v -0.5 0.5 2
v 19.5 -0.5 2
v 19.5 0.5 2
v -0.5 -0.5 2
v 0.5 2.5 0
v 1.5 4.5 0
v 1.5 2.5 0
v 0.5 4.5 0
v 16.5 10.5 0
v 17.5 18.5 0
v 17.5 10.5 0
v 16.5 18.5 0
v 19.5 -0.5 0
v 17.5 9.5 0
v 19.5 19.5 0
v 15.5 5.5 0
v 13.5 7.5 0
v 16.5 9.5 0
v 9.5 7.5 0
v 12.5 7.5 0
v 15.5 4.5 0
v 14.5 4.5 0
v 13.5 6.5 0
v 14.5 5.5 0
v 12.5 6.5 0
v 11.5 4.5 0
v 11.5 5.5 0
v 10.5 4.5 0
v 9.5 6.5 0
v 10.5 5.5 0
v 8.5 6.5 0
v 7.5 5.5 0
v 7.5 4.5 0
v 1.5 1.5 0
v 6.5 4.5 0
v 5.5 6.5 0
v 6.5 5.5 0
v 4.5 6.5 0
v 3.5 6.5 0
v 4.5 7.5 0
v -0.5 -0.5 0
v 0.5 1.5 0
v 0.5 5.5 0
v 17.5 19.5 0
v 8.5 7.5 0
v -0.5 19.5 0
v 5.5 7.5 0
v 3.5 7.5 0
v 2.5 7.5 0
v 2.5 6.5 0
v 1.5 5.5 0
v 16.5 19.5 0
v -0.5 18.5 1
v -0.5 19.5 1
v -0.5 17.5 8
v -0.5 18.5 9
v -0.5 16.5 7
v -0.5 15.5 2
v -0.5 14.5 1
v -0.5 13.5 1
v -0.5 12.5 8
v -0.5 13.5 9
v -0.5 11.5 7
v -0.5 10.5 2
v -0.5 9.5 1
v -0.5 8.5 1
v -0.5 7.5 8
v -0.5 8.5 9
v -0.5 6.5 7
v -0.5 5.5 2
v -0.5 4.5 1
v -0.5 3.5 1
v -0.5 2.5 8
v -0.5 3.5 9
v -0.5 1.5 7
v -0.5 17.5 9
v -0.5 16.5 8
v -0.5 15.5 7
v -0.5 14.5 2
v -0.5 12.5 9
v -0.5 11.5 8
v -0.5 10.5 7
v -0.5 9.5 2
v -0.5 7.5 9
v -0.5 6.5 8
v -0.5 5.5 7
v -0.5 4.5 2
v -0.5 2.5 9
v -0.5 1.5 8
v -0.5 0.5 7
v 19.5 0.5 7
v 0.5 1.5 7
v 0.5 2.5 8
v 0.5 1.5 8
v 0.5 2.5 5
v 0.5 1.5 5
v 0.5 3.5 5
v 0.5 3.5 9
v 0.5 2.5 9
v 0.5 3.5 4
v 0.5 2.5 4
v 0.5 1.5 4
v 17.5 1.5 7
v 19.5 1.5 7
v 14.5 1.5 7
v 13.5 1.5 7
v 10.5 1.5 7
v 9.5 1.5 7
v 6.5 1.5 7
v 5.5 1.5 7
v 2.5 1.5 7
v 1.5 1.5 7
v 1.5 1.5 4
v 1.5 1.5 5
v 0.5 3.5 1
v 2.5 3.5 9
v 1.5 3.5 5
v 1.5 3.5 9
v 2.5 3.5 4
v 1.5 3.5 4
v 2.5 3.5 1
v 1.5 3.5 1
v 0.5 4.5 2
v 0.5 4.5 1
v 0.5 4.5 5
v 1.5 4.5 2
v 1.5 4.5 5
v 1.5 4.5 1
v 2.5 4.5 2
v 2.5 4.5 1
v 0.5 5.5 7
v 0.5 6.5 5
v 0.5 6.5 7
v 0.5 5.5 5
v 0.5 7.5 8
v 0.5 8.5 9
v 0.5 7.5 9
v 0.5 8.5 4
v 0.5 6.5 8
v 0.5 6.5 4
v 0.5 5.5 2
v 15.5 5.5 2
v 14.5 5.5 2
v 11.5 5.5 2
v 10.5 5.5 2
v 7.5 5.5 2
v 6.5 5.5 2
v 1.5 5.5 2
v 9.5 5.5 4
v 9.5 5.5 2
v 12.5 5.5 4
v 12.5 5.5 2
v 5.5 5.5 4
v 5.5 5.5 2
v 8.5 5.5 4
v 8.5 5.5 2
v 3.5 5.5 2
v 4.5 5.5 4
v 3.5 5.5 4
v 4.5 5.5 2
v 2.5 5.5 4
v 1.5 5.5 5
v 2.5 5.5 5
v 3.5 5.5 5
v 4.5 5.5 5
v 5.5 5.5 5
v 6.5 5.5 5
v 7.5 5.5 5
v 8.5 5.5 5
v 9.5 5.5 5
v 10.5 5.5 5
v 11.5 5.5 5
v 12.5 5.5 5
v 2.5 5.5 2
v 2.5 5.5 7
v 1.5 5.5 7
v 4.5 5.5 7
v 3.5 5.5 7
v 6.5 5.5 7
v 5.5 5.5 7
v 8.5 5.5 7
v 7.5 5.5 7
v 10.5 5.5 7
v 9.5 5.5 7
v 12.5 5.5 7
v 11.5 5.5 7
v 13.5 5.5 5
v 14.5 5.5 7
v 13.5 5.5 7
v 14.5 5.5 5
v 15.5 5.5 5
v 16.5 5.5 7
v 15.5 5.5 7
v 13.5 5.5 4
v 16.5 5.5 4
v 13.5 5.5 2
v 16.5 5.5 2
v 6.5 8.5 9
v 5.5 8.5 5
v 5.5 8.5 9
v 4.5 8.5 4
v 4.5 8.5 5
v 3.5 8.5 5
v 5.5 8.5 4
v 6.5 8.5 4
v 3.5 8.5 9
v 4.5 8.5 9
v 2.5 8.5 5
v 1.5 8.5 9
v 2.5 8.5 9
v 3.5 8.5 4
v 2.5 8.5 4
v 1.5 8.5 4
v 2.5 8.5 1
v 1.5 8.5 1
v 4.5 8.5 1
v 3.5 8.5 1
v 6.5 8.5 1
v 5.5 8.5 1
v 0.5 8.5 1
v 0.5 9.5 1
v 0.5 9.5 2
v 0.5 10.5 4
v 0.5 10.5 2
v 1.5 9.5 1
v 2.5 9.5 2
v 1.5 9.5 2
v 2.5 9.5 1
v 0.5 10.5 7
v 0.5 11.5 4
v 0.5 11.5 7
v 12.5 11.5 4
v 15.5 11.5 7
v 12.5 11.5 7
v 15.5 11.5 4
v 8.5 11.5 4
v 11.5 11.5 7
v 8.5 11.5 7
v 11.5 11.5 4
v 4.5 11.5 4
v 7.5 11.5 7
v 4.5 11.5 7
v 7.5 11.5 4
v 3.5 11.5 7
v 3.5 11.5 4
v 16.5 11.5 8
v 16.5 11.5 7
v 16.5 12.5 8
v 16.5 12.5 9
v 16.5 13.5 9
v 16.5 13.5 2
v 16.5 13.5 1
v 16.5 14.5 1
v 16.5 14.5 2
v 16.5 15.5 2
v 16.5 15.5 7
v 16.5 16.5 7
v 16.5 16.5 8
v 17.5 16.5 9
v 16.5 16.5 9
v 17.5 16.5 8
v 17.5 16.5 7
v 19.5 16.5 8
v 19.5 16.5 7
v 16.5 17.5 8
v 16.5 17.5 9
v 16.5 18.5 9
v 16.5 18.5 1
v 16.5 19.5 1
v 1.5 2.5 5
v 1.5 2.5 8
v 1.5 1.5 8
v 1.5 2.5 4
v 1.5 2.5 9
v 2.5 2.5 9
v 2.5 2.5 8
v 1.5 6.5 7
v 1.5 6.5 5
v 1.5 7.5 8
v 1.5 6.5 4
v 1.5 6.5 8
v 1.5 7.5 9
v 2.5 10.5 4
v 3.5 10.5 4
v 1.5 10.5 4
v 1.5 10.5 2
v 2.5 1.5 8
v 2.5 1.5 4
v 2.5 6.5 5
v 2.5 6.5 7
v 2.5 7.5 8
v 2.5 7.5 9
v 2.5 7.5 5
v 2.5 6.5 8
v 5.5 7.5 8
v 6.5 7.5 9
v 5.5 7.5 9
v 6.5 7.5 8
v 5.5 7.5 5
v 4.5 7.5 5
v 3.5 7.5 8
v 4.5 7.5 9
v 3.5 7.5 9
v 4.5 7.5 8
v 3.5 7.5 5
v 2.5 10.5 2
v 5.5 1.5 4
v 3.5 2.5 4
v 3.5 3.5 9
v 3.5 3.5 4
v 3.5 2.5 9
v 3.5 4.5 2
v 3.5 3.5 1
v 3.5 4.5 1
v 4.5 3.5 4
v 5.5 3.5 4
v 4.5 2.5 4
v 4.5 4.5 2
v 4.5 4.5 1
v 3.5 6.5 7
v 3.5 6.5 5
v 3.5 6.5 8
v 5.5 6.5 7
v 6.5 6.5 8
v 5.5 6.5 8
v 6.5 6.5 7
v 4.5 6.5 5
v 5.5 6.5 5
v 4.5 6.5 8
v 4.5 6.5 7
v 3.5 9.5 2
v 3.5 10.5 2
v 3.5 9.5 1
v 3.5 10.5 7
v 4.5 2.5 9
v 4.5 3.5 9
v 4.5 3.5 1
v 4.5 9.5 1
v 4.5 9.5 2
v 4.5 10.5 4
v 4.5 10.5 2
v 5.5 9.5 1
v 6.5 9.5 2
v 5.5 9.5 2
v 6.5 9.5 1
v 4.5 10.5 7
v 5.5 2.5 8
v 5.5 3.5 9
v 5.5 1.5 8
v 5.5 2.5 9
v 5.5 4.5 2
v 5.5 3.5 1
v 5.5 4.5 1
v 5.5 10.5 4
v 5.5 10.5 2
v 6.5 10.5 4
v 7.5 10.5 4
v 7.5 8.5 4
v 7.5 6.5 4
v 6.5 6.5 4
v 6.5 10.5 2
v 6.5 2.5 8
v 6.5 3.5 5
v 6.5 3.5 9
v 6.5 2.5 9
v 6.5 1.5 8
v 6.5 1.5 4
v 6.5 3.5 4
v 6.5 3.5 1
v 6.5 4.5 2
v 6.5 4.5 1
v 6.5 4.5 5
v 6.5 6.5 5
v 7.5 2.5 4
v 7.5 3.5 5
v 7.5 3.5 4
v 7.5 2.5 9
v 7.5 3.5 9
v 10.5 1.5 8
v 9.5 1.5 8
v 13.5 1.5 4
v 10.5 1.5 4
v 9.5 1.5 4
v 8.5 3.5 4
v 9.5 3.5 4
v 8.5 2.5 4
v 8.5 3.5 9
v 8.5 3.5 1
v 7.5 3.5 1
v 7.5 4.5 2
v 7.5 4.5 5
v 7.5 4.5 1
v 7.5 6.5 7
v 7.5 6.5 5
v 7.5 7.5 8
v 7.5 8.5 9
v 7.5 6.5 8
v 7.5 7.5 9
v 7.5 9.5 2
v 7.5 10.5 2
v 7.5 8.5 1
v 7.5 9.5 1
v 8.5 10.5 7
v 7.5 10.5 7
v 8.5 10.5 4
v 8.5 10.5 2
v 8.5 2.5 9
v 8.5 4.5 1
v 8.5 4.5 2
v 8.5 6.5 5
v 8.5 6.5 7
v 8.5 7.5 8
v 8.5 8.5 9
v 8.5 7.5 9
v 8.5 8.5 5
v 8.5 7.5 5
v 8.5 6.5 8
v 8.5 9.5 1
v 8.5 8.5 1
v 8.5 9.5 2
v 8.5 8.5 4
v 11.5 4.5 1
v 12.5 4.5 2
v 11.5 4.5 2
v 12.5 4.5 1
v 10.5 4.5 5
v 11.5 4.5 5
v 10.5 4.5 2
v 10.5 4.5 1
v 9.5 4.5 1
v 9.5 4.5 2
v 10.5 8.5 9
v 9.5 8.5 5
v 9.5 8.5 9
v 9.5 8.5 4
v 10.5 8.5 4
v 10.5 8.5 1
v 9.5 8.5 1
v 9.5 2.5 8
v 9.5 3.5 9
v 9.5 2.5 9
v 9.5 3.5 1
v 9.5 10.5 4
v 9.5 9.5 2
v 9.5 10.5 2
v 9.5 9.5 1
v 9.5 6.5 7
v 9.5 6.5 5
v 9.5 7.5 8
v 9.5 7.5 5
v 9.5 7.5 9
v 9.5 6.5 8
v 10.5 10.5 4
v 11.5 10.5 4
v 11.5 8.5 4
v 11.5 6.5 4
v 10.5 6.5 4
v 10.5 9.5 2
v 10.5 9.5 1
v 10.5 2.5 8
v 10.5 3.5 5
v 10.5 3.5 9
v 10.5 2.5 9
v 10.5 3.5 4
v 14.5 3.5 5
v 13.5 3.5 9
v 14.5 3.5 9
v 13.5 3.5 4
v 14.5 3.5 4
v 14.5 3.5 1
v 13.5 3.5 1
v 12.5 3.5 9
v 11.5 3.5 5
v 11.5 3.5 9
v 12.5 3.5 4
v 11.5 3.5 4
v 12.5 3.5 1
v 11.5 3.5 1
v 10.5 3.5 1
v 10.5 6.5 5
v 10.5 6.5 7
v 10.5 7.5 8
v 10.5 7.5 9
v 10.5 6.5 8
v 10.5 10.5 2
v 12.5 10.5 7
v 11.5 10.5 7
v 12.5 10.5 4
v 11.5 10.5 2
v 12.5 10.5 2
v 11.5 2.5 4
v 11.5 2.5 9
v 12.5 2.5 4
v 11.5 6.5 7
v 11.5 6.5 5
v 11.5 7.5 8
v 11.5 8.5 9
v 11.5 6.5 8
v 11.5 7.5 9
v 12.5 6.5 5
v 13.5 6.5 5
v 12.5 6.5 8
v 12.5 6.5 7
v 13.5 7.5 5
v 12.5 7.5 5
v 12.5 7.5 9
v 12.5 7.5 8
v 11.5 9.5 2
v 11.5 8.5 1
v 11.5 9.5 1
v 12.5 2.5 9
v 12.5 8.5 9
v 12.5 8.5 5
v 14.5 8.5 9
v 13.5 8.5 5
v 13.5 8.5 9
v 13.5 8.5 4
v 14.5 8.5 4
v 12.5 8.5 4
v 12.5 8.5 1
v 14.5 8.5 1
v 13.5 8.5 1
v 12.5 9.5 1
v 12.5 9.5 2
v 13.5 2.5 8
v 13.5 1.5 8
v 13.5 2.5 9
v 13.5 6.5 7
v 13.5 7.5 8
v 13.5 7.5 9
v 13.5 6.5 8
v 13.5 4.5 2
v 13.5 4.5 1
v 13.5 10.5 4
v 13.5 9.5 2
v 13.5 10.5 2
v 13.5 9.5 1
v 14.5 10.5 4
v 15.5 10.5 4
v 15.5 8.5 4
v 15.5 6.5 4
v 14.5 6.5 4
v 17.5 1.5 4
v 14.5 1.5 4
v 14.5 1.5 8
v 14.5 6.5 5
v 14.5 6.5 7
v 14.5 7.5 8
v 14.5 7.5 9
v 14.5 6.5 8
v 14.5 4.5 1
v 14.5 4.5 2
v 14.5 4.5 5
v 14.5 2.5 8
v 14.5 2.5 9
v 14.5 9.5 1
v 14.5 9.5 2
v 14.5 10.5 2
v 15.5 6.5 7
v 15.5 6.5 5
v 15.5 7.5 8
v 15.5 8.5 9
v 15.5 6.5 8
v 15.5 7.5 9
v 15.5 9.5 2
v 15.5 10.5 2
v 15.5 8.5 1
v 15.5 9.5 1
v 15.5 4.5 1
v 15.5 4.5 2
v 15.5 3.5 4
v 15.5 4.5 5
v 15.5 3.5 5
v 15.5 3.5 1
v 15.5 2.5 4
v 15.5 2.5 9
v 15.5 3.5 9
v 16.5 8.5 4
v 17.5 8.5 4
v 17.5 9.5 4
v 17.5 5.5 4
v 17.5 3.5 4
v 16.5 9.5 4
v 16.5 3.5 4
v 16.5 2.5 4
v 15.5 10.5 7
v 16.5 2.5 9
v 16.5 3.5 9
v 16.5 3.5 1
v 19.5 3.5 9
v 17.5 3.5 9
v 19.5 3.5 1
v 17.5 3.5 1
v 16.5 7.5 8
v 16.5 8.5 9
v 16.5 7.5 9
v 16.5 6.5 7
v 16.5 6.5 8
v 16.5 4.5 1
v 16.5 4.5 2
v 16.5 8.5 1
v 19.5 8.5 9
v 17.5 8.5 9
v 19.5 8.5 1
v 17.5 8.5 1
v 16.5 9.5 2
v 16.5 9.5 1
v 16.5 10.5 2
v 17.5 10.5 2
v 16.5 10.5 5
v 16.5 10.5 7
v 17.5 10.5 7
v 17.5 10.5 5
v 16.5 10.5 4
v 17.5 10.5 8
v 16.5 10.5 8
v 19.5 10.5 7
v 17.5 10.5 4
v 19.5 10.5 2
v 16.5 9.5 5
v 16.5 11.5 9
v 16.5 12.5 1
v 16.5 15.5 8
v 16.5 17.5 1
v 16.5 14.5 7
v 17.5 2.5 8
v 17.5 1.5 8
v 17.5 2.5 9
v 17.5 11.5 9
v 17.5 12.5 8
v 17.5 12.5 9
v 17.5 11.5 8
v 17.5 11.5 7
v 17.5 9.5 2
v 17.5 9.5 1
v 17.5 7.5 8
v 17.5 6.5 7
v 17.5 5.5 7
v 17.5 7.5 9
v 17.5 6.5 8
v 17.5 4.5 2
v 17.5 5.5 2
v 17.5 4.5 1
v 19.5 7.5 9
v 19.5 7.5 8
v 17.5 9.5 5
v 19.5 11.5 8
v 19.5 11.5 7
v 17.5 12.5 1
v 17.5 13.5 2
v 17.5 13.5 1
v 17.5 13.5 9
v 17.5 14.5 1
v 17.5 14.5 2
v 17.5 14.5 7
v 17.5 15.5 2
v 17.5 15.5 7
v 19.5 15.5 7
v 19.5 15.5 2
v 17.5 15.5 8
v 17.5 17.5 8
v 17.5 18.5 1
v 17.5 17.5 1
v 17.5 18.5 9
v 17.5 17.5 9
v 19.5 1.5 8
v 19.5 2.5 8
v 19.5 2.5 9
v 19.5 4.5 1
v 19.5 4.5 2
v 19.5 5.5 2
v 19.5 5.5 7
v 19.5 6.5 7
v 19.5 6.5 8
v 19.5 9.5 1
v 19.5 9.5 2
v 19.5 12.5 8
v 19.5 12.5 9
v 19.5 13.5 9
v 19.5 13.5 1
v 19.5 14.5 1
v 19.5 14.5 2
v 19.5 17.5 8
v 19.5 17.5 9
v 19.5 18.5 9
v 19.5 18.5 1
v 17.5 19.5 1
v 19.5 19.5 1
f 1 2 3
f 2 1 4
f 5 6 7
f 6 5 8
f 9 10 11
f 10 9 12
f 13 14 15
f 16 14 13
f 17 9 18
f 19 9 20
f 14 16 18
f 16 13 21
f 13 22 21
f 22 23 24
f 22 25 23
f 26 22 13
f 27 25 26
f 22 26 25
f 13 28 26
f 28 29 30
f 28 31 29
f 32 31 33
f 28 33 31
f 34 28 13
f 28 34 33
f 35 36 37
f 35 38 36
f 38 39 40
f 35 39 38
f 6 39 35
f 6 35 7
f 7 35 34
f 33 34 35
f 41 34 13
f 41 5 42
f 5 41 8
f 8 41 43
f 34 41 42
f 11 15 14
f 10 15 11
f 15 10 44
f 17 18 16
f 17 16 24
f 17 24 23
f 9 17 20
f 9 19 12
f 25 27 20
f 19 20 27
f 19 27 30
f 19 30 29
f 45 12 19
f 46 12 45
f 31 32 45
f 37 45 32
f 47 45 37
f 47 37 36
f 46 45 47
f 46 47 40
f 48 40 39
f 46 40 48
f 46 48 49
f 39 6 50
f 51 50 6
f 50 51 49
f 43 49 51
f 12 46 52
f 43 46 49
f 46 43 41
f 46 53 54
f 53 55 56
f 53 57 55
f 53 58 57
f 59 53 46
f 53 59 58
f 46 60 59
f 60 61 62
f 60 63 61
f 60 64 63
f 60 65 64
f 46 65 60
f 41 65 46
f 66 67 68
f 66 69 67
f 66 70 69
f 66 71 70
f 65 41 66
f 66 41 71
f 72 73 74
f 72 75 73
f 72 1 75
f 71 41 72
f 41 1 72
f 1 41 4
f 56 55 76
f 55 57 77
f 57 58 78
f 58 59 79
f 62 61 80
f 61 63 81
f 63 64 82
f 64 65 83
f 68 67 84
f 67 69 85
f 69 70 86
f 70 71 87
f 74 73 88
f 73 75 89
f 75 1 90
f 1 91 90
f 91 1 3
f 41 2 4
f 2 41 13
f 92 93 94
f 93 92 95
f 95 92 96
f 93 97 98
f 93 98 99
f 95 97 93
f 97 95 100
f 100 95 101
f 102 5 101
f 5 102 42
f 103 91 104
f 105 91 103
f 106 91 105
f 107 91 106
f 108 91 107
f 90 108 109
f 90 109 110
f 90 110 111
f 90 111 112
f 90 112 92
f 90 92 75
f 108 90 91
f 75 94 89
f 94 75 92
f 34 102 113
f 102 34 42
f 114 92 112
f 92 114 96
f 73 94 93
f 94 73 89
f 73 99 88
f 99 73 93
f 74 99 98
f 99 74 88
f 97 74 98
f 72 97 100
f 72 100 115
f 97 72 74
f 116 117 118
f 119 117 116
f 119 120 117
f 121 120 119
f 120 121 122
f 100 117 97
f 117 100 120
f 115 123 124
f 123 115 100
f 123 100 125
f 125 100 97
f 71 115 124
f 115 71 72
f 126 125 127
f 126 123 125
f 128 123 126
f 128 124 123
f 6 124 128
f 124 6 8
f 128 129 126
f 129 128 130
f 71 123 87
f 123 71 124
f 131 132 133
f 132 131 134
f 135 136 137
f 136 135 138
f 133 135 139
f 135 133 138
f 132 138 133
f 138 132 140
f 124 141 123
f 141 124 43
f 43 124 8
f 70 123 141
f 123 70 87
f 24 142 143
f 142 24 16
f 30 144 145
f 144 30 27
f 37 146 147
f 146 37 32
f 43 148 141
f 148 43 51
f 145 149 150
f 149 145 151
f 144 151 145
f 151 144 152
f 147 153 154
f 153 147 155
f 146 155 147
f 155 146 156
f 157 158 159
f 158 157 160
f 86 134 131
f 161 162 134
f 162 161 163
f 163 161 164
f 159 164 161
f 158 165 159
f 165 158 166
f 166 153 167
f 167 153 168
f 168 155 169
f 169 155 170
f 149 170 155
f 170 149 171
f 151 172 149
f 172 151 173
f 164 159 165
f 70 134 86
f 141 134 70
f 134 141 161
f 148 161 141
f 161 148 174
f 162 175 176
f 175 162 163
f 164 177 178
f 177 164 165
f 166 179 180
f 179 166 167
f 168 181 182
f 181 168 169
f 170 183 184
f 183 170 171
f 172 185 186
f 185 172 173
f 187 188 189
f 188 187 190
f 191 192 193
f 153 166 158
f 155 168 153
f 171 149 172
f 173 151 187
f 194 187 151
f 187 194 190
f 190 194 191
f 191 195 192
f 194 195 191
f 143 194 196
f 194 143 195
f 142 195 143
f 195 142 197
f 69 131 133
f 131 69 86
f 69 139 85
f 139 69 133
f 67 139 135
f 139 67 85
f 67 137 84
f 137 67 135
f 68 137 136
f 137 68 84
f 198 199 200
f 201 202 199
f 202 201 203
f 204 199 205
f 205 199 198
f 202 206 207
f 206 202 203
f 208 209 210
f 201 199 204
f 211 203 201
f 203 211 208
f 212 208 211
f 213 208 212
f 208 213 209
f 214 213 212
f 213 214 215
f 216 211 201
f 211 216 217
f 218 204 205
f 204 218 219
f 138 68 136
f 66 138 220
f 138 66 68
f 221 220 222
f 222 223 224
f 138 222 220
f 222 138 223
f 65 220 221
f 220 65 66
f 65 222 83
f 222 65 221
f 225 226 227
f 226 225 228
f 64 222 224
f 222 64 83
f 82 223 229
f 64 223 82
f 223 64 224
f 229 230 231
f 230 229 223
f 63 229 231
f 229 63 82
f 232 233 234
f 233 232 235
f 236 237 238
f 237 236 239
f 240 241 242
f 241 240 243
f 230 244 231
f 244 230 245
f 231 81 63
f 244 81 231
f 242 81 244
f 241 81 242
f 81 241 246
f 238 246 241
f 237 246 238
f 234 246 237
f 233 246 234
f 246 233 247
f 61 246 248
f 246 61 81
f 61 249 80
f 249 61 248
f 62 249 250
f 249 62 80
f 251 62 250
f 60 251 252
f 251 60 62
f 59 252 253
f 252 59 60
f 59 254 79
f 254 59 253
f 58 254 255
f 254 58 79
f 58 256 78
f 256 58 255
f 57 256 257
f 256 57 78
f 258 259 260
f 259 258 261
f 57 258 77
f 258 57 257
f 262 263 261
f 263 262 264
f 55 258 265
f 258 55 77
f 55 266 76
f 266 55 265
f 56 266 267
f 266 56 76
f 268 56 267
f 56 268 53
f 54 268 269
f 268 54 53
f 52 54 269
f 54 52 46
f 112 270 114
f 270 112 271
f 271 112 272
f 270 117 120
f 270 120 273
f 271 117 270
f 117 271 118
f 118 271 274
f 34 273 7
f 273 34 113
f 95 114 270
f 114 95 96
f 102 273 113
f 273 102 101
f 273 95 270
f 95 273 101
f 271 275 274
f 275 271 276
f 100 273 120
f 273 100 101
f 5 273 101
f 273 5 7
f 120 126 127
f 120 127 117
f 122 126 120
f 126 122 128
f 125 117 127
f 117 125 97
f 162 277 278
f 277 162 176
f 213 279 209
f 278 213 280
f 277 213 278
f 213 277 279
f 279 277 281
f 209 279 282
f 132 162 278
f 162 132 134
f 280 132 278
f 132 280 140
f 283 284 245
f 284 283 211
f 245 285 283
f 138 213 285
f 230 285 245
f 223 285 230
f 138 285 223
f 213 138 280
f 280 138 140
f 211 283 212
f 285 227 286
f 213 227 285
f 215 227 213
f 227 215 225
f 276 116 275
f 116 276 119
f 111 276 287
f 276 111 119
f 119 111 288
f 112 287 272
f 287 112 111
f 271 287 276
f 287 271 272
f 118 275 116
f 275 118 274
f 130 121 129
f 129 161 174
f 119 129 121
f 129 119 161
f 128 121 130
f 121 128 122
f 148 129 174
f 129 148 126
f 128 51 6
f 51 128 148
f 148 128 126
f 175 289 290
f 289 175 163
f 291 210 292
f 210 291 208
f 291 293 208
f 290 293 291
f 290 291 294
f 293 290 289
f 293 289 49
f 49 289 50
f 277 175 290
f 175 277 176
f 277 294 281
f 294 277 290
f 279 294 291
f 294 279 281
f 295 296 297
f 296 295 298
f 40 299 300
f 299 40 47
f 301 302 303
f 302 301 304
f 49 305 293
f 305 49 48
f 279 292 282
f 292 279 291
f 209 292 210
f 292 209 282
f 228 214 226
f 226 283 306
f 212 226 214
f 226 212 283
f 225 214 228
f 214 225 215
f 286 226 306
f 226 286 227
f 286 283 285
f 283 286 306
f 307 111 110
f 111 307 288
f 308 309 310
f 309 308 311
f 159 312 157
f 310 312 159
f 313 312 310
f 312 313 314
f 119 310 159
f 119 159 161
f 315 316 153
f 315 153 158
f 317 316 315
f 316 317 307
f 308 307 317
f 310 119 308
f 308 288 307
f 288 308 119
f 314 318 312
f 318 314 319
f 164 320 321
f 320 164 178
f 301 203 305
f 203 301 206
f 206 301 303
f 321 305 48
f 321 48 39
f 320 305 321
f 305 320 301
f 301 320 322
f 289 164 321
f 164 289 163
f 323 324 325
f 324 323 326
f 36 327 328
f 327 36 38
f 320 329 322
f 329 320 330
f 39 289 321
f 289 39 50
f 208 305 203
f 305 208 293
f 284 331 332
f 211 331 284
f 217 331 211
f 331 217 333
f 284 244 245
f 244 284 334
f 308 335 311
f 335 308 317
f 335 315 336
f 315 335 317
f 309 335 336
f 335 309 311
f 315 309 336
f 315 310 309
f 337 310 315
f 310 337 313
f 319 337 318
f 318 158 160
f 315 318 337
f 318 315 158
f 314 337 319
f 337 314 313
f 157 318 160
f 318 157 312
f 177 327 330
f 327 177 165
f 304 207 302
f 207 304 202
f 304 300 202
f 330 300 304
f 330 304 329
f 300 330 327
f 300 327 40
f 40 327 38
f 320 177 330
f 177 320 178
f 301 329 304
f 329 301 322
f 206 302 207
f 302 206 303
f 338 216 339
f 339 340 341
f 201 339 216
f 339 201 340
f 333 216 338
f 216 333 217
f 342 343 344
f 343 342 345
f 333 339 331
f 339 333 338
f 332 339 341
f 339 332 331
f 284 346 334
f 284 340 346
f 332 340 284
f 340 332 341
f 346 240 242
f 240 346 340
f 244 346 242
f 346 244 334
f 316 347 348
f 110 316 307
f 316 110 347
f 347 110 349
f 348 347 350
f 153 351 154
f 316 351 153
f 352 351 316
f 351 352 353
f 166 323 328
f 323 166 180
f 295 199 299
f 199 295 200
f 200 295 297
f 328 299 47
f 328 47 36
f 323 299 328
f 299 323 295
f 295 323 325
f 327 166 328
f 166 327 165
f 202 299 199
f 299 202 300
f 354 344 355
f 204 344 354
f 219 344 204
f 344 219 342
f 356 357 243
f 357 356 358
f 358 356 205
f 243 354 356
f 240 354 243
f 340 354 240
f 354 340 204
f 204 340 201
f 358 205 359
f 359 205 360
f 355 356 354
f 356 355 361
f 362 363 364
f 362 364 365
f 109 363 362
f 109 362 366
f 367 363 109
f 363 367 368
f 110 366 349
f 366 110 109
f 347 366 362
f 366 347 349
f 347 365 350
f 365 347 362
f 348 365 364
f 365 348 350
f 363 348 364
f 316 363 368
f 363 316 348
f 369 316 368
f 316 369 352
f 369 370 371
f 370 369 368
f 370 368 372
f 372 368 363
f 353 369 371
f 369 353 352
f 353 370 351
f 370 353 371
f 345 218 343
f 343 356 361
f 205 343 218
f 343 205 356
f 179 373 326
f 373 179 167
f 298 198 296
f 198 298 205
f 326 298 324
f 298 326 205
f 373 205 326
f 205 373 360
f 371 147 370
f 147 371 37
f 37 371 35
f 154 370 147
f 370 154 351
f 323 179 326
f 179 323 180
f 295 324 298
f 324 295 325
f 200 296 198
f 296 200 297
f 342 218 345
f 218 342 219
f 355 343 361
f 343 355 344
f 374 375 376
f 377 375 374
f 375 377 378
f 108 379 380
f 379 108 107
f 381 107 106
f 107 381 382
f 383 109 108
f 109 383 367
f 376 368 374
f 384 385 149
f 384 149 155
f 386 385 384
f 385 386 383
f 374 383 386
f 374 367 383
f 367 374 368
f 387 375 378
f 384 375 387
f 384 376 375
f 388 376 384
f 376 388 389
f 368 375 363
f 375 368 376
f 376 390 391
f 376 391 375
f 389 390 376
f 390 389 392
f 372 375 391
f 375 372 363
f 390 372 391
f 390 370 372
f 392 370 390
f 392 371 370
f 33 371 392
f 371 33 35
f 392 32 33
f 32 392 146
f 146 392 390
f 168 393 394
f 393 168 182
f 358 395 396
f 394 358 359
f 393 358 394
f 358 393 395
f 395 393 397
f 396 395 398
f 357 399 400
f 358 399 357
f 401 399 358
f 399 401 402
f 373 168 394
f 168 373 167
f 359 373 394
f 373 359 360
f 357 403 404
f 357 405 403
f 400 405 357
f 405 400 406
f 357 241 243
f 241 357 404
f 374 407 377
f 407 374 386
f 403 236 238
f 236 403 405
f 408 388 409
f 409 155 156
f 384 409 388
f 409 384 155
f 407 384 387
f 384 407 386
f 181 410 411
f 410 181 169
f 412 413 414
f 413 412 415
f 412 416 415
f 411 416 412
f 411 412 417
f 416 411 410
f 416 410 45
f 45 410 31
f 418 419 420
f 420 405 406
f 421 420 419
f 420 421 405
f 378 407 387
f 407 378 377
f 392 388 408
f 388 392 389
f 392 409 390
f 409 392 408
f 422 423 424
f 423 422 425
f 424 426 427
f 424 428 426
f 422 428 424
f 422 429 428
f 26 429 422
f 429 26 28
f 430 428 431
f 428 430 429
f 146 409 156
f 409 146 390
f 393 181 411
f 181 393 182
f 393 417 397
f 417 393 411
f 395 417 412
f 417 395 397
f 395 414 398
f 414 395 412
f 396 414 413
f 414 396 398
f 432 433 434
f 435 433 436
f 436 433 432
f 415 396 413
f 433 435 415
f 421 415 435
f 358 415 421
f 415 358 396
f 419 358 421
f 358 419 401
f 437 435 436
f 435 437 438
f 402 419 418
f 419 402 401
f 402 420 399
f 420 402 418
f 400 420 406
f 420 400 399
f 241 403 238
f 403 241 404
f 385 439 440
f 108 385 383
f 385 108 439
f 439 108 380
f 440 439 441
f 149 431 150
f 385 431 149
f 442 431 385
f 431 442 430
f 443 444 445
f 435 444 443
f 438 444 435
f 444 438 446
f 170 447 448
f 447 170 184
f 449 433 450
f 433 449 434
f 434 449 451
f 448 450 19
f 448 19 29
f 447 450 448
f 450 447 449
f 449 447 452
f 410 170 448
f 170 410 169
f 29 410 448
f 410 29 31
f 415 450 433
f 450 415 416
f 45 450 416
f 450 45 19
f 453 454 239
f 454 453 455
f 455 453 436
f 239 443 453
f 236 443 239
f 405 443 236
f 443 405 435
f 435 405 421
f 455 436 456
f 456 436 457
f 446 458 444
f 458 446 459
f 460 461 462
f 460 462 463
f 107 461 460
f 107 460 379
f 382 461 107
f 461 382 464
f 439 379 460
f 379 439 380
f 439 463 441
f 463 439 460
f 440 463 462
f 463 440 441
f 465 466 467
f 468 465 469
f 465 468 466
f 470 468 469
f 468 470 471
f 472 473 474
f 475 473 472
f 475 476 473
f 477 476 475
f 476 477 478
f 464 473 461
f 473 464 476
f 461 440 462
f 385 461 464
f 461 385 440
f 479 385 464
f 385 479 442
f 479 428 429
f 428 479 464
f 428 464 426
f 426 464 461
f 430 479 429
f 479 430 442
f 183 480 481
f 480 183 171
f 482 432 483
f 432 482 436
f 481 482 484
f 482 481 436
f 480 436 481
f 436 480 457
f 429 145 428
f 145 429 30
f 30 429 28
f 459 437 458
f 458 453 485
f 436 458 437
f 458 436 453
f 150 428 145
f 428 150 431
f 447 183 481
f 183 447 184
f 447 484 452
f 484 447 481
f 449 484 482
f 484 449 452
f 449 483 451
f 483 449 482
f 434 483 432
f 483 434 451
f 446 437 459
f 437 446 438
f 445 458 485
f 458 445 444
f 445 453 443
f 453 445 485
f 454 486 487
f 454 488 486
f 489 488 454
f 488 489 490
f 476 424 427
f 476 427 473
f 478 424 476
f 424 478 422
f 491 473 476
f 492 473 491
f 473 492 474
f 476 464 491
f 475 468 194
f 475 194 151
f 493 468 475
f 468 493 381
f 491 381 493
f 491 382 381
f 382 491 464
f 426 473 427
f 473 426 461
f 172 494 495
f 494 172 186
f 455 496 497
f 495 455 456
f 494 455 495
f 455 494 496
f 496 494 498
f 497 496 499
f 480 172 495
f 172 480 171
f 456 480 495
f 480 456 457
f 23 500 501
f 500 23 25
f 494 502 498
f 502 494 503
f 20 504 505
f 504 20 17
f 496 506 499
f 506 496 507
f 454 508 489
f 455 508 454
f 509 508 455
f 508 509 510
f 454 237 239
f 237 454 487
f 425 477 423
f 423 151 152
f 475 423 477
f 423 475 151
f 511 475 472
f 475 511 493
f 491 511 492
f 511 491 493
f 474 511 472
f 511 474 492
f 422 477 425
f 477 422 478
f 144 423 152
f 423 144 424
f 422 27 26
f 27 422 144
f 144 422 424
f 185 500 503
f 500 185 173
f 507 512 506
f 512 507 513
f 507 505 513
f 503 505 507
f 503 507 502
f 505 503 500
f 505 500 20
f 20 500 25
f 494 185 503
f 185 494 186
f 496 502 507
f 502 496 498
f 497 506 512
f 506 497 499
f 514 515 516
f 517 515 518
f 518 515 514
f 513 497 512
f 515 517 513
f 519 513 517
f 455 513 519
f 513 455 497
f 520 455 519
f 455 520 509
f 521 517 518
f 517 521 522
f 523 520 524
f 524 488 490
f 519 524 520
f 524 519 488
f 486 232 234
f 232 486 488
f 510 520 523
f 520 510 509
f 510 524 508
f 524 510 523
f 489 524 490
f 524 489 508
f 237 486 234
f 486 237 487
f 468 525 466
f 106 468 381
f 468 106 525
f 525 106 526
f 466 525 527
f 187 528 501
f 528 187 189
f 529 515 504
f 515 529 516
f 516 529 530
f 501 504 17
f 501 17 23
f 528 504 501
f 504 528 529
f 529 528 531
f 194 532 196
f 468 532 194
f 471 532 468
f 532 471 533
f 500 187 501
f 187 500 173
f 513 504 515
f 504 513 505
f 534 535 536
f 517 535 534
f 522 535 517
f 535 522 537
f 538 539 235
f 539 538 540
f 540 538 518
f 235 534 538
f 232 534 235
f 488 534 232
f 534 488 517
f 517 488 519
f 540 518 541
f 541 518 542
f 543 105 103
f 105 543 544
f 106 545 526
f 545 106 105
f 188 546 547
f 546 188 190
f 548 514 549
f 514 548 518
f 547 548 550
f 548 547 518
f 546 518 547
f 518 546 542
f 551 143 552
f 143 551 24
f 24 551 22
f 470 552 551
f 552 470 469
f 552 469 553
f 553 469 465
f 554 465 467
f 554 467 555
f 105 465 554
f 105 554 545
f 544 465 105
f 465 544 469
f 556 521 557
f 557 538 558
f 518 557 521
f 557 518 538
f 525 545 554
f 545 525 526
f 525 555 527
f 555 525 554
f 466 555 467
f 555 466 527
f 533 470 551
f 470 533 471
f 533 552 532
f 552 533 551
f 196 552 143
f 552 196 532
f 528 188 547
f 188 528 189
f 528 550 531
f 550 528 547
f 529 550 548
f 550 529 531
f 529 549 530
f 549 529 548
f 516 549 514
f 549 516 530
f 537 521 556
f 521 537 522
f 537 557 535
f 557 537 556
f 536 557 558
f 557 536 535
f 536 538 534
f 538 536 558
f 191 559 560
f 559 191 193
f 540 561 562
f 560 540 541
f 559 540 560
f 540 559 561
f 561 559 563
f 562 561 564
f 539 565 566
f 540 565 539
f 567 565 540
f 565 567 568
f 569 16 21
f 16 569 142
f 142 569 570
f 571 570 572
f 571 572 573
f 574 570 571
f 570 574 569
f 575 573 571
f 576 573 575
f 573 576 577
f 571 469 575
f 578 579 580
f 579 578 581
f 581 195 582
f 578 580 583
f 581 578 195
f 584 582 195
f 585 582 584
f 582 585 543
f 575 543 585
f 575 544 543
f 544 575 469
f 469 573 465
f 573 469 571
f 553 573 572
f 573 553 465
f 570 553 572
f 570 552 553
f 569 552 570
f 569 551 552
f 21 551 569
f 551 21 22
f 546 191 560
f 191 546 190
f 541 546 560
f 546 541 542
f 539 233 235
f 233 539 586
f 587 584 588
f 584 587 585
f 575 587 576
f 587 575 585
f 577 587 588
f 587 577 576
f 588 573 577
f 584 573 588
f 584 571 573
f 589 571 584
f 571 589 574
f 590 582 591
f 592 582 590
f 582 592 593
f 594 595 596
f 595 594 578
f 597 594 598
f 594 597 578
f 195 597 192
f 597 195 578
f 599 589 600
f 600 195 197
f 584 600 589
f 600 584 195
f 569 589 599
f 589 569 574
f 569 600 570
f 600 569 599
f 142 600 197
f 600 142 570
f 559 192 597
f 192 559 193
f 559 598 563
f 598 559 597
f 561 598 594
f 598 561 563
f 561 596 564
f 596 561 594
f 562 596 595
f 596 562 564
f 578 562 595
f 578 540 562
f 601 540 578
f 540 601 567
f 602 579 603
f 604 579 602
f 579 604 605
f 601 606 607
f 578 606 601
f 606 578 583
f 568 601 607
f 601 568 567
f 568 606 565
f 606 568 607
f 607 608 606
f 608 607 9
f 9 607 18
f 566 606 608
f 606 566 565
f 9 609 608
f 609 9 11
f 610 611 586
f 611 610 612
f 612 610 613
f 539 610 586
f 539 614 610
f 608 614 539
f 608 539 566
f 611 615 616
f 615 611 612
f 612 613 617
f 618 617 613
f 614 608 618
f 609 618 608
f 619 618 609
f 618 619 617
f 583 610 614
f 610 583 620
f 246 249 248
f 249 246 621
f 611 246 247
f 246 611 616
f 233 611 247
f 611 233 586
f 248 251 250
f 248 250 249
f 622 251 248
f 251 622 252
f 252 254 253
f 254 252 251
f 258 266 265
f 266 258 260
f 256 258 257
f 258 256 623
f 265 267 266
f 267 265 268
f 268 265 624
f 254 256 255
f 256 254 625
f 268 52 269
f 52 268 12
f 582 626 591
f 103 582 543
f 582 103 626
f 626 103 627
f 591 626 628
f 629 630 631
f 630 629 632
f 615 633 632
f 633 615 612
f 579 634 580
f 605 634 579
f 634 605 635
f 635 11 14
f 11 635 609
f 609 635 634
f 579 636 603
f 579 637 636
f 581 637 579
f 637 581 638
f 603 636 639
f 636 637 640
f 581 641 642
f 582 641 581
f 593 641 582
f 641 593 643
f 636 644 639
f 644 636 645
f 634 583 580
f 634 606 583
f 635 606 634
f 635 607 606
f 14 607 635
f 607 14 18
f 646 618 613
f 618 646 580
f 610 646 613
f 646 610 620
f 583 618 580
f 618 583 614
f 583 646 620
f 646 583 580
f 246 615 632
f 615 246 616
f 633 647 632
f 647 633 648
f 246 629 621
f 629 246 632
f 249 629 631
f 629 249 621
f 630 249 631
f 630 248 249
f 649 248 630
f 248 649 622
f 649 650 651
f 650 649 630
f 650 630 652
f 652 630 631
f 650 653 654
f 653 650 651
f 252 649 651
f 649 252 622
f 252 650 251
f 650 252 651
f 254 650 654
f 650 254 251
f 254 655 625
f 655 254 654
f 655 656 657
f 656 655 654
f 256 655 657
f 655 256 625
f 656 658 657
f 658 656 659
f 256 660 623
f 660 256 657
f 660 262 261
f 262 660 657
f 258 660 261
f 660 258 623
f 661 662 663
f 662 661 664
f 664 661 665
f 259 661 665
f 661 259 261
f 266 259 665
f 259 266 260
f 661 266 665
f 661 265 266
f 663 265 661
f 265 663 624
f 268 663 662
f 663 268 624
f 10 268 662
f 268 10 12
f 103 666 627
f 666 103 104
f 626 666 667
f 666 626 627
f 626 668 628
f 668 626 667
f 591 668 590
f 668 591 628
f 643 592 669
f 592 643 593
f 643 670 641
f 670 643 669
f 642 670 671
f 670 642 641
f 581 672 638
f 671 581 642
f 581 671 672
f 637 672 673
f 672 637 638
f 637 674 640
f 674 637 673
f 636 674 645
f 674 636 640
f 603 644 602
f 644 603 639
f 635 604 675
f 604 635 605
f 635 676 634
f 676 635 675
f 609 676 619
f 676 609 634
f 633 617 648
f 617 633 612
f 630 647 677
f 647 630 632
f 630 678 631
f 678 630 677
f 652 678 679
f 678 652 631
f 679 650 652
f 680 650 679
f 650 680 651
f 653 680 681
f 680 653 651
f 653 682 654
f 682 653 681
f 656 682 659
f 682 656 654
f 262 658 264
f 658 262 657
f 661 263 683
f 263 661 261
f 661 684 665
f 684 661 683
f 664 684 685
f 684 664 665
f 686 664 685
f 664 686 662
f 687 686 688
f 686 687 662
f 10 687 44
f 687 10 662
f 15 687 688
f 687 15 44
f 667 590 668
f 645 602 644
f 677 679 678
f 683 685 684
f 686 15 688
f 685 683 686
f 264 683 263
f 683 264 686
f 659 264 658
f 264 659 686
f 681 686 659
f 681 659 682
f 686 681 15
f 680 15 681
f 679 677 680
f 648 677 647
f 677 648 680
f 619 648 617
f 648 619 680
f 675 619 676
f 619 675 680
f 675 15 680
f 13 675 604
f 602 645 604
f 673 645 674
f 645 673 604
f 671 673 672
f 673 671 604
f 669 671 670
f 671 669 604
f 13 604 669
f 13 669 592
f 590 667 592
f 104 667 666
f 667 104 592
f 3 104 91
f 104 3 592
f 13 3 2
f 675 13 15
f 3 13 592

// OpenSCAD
union() {
    translate([0, 0, 1.0]) cube([1, 1, 2], center=true);
    translate([0, 1, 3.5]) cube([1, 1, 7], center=true);
    translate([0, 2, 4.0]) cube([1, 1, 8], center=true);
    translate([0, 3, 4.5]) cube([1, 1, 9], center=true);
    translate([0, 4, 0.5]) cube([1, 1, 1], center=true);
    translate([0, 5, 1.0]) cube([1, 1, 2], center=true);
    translate([0, 6, 3.5]) cube([1, 1, 7], center=true);
    translate([0, 7, 4.0]) cube([1, 1, 8], center=true);
    translate([0, 8, 4.5]) cube([1, 1, 9], center=true);
    translate([0, 9, 0.5]) cube([1, 1, 1], center=true);
    translate([0, 10, 1.0]) cube([1, 1, 2], center=true);
    translate([0, 11, 3.5]) cube([1, 1, 7], center=true);
    translate([0, 12, 4.0]) cube([1, 1, 8], center=true);
    translate([0, 13, 4.5]) cube([1, 1, 9], center=true);
    translate([0, 14, 0.5]) cube([1, 1, 1], center=true);
    translate([0, 15, 1.0]) cube([1, 1, 2], center=true);
    translate([0, 16, 3.5]) cube([1, 1, 7], center=true);
    translate([0, 17, 4.0]) cube([1, 1, 8], center=true);
    translate([0, 18, 4.5]) cube([1, 1, 9], center=true);
    translate([0, 19, 0.5]) cube([1, 1, 1], center=true);
    translate([1, 0, 1.0]) cube([1, 1, 2], center=true);
    translate([1, 1, 3.5]) cube([1, 1, 7], center=true);
    translate([1, 2, 4.5]) color([1, 0, 0]) cube([1, 1, 1], center=true);
    translate([1, 3, 2.0]) cube([1, 1, 4], center=true);
    translate([1, 4, 2.5]) cube([1, 1, 5], center=true);
    translate([1, 6, 2.5]) cube([1, 1, 5], center=true);
    translate([1, 7, 2.0]) cube([1, 1, 4], center=true);
    translate([1, 8, 2.0]) cube([1, 1, 4], center=true);
    translate([1, 9, 2.0]) cube([1, 1, 4], center=true);
    translate([1, 10, 2.0]) cube([1, 1, 4], center=true);
    translate([1, 11, 2.0]) cube([1, 1, 4], center=true);
    translate([1, 12, 4.0]) cube([1, 1, 8], center=true);
    translate([1, 13, 4.5]) cube([1, 1, 9], center=true);
    translate([1, 14, 0.5]) cube([1, 1, 1], center=true);
    translate([1, 15, 1.0]) cube([1, 1, 2], center=true);
    translate([1, 16, 3.5]) cube([1, 1, 7], center=true);
    translate([1, 17, 4.0]) cube([1, 1, 8], center=true);
    translate([1, 18, 4.5]) cube([1, 1, 9], center=true);
    translate([1, 19, 0.5]) cube([1, 1, 1], center=true);
    translate([2, 0, 1.0]) cube([1, 1, 2], center=true);
    translate([2, 1, 3.5]) cube([1, 1, 7], center=true);
    translate([2, 2, 4.0]) cube([1, 1, 8], center=true);
    translate([2, 3, 4.5]) cube([1, 1, 9], center=true);
    translate([2, 4, 0.5]) cube([1, 1, 1], center=true);
    translate([2, 5, 1.0]) cube([1, 1, 2], center=true);
    translate([2, 6, 3.5]) cube([1, 1, 7], center=true);
    translate([2, 7, 4.0]) cube([1, 1, 8], center=true);
    translate([2, 8, 4.5]) cube([1, 1, 9], center=true);
    translate([2, 9, 0.5]) cube([1, 1, 1], center=true);
    translate([2, 10, 1.0]) cube([1, 1, 2], center=true);
    translate([2, 11, 2.0]) cube([1, 1, 4], center=true);
    translate([2, 12, 4.0]) cube([1, 1, 8], center=true);
    translate([2, 13, 4.5]) cube([1, 1, 9], center=true);
    translate([2, 14, 0.5]) cube([1, 1, 1], center=true);
    translate([2, 15, 1.0]) cube([1, 1, 2], center=true);
    translate([2, 16, 3.5]) cube([1, 1, 7], center=true);
    translate([2, 17, 4.0]) cube([1, 1, 8], center=true);
    translate([2, 18, 4.5]) cube([1, 1, 9], center=true);
    translate([2, 19, 0.5]) cube([1, 1, 1], center=true);
    translate([3, 0, 1.0]) cube([1, 1, 2], center=true);
    translate([3, 1, 3.5]) cube([1, 1, 7], center=true);
    translate([3, 2, 2.0]) cube([1, 1, 4], center=true);
    translate([3, 3, 2.0]) cube([1, 1, 4], center=true);
    translate([3, 4, 2.0]) cube([1, 1, 4], center=true);
    translate([3, 5, 2.0]) cube([1, 1, 4], center=true);
    translate([3, 6, 2.5]) cube([1, 1, 5], center=true);
    translate([3, 8, 2.5]) cube([1, 1, 5], center=true);
    translate([3, 9, 2.0]) cube([1, 1, 4], center=true);
    translate([3, 10, 2.0]) cube([1, 1, 4], center=true);
    translate([3, 11, 2.0]) cube([1, 1, 4], center=true);
    translate([3, 12, 4.0]) cube([1, 1, 8], center=true);
    translate([3, 13, 4.5]) cube([1, 1, 9], center=true);
    translate([3, 14, 0.5]) cube([1, 1, 1], center=true);
    translate([3, 15, 1.0]) cube([1, 1, 2], center=true);
    translate([3, 16, 3.5]) cube([1, 1, 7], center=true);
    translate([3, 17, 4.0]) cube([1, 1, 8], center=true);
    translate([3, 18, 4.5]) cube([1, 1, 9], center=true);
    translate([3, 19, 0.5]) cube([1, 1, 1], center=true);
    translate([4, 0, 1.0]) cube([1, 1, 2], center=true);
    translate([4, 1, 3.5]) cube([1, 1, 7], center=true);
    translate([4, 2, 2.0]) cube([1, 1, 4], center=true);
    translate([4, 3, 4.5]) cube([1, 1, 9], center=true);
    translate([4, 4, 0.5]) cube([1, 1, 1], center=true);
    translate([4, 5, 1.0]) cube([1, 1, 2], center=true);
    translate([4, 6, 3.5]) cube([1, 1, 7], center=true);
    translate([4, 7, 4.0]) cube([1, 1, 8], center=true);
    translate([4, 8, 4.5]) cube([1, 1, 9], center=true);
    translate([4, 9, 0.5]) cube([1, 1, 1], center=true);
    translate([4, 10, 1.0]) cube([1, 1, 2], center=true);
    translate([4, 11, 3.5]) cube([1, 1, 7], center=true);
    translate([4, 12, 4.0]) cube([1, 1, 8], center=true);
    translate([4, 13, 4.5]) cube([1, 1, 9], center=true);
    translate([4, 14, 0.5]) cube([1, 1, 1], center=true);
    translate([4, 15, 1.0]) cube([1, 1, 2], center=true);
    translate([4, 16, 3.5]) cube([1, 1, 7], center=true);
    translate([4, 17, 4.0]) cube([1, 1, 8], center=true);
    translate([4, 18, 4.5]) cube([1, 1, 9], center=true);
    translate([4, 19, 0.5]) cube([1, 1, 1], center=true);
    translate([5, 0, 1.0]) cube([1, 1, 2], center=true);
    translate([5, 1, 3.5]) cube([1, 1, 7], center=true);
    translate([5, 2, 2.0]) cube([1, 1, 4], center=true);
    translate([5, 3, 2.0]) cube([1, 1, 4], center=true);
    translate([5, 4, 2.0]) cube([1, 1, 4], center=true);
    translate([5, 5, 2.0]) cube([1, 1, 4], center=true);
    translate([5, 6, 2.5]) cube([1, 1, 5], center=true);
    translate([5, 8, 2.5]) cube([1, 1, 5], center=true);
    translate([5, 9, 2.0]) cube([1, 1, 4], center=true);
    translate([5, 10, 2.0]) cube([1, 1, 4], center=true);
    translate([5, 11, 2.0]) cube([1, 1, 4], center=true);
    translate([5, 12, 4.0]) cube([1, 1, 8], center=true);
    translate([5, 13, 4.5]) cube([1, 1, 9], center=true);
    translate([5, 14, 0.5]) cube([1, 1, 1], center=true);
    translate([5, 15, 1.0]) cube([1, 1, 2], center=true);
    translate([5, 16, 3.5]) cube([1, 1, 7], center=true);
    translate([5, 17, 4.0]) cube([1, 1, 8], center=true);
    translate([5, 18, 4.5]) cube([1, 1, 9], center=true);
    translate([5, 19, 0.5]) cube([1, 1, 1], center=true);
    translate([6, 0, 1.0]) cube([1, 1, 2], center=true);
    translate([6, 1, 3.5]) cube([1, 1, 7], center=true);
    translate([6, 2, 4.0]) cube([1, 1, 8], center=true);
    translate([6, 3, 4.5]) cube([1, 1, 9], center=true);
    translate([6, 4, 0.5]) cube([1, 1, 1], center=true);
    translate([6, 5, 1.0]) cube([1, 1, 2], center=true);
    translate([6, 6, 3.5]) cube([1, 1, 7], center=true);
    translate([6, 7, 4.0]) cube([1, 1, 8], center=true);
    translate([6, 8, 4.5]) cube([1, 1, 9], center=true);
    translate([6, 9, 0.5]) cube([1, 1, 1], center=true);
    translate([6, 10, 1.0]) cube([1, 1, 2], center=true);
    translate([6, 11, 2.0]) cube([1, 1, 4], center=true);
    translate([6, 12, 4.0]) cube([1, 1, 8], center=true);
    translate([6, 13, 4.5]) cube([1, 1, 9], center=true);
    translate([6, 14, 0.5]) cube([1, 1, 1], center=true);
    translate([6, 15, 1.0]) cube([1, 1, 2], center=true);
    translate([6, 16, 3.5]) cube([1, 1, 7], center=true);
    translate([6, 17, 4.0]) cube([1, 1, 8], center=true);
    translate([6, 18, 4.5]) cube([1, 1, 9], center=true);
    translate([6, 19, 0.5]) cube([1, 1, 1], center=true);
    translate([7, 0, 1.0]) cube([1, 1, 2], center=true);
    translate([7, 1, 3.5]) cube([1, 1, 7], center=true);
    translate([7, 2, 2.0]) cube([1, 1, 4], center=true);
    translate([7, 3, 2.0]) cube([1, 1, 4], center=true);
    translate([7, 4, 2.5]) cube([1, 1, 5], center=true);
    translate([7, 6, 2.5]) cube([1, 1, 5], center=true);
    translate([7, 7, 2.0]) cube([1, 1, 4], center=true);
    translate([7, 8, 2.0]) cube([1, 1, 4], center=true);
    translate([7, 9, 2.0]) cube([1, 1, 4], center=true);
    translate([7, 10, 2.0]) cube([1, 1, 4], center=true);
    translate([7, 11, 2.0]) cube([1, 1, 4], center=true);
    translate([7, 12, 4.0]) cube([1, 1, 8], center=true);
    translate([7, 13, 4.5]) cube([1, 1, 9], center=true);
    translate([7, 14, 0.5]) cube([1, 1, 1], center=true);
    translate([7, 15, 1.0]) cube([1, 1, 2], center=true);
    translate([7, 16, 3.5]) cube([1, 1, 7], center=true);
    translate([7, 17, 4.0]) cube([1, 1, 8], center=true);
    translate([7, 18, 4.5]) cube([1, 1, 9], center=true);
    translate([7, 19, 0.5]) cube([1, 1, 1], center=true);
    translate([8, 0, 1.0]) cube([1, 1, 2], center=true);
    translate([8, 1, 3.5]) cube([1, 1, 7], center=true);
    translate([8, 2, 2.0]) cube([1, 1, 4], center=true);
    translate([8, 3, 4.5]) cube([1, 1, 9], center=true);
    translate([8, 4, 0.5]) cube([1, 1, 1], center=true);
    translate([8, 5, 1.0]) cube([1, 1, 2], center=true);
    translate([8, 6, 3.5]) cube([1, 1, 7], center=true);
    translate([8, 7, 4.0]) cube([1, 1, 8], center=true);
    translate([8, 8, 4.5]) cube([1, 1, 9], center=true);
    translate([8, 9, 0.5]) cube([1, 1, 1], center=true);
    translate([8, 10, 1.0]) cube([1, 1, 2], center=true);
    translate([8, 11, 3.5]) cube([1, 1, 7], center=true);
    translate([8, 12, 4.0]) cube([1, 1, 8], center=true);
    translate([8, 13, 4.5]) cube([1, 1, 9], center=true);
    translate([8, 14, 0.5]) cube([1, 1, 1], center=true);
    translate([8, 15, 1.0]) cube([1, 1, 2], center=true);
    translate([8, 16, 3.5]) cube([1, 1, 7], center=true);
    translate([8, 17, 4.0]) cube([1, 1, 8], center=true);
    translate([8, 18, 4.5]) cube([1, 1, 9], center=true);
    translate([8, 19, 0.5]) cube([1, 1, 1], center=true);
    translate([9, 0, 1.0]) cube([1, 1, 2], center=true);
    translate([9, 1, 3.5]) cube([1, 1, 7], center=true);
    translate([9, 2, 2.0]) cube([1, 1, 4], center=true);
    translate([9, 3, 2.0]) cube([1, 1, 4], center=true);
    translate([9, 4, 2.0]) cube([1, 1, 4], center=true);
    translate([9, 5, 2.0]) cube([1, 1, 4], center=true);
    translate([9, 6, 2.5]) cube([1, 1, 5], center=true);
    translate([9, 8, 2.5]) cube([1, 1, 5], center=true);
    translate([9, 9, 2.0]) cube([1, 1, 4], center=true);
    translate([9, 10, 2.0]) cube([1, 1, 4], center=true);
    translate([9, 11, 2.0]) cube([1, 1, 4], center=true);
    translate([9, 12, 4.0]) cube([1, 1, 8], center=true);
    translate([9, 13, 4.5]) cube([1, 1, 9], center=true);
    translate([9, 14, 0.5]) cube([1, 1, 1], center=true);
    translate([9, 15, 1.0]) cube([1, 1, 2], center=true);
    translate([9, 16, 3.5]) cube([1, 1, 7], center=true);
    translate([9, 17, 4.0]) cube([1, 1, 8], center=true);
    translate([9, 18, 4.5]) cube([1, 1, 9], center=true);
    translate([9, 19, 0.5]) cube([1, 1, 1], center=true);
    translate([10, 0, 1.0]) cube([1, 1, 2], center=true);
    translate([10, 1, 3.5]) cube([1, 1, 7], center=true);
    translate([10, 2, 4.0]) cube([1, 1, 8], center=true);
    translate([10, 3, 4.5]) cube([1, 1, 9], center=true);
    translate([10, 4, 0.5]) cube([1, 1, 1], center=true);
    translate([10, 5, 1.0]) cube([1, 1, 2], center=true);
    translate([10, 6, 3.5]) cube([1, 1, 7], center=true);
    translate([10, 7, 4.0]) cube([1, 1, 8], center=true);
    translate([10, 8, 4.5]) cube([1, 1, 9], center=true);
    translate([10, 9, 0.5]) cube([1, 1, 1], center=true);
    translate([10, 10, 1.0]) cube([1, 1, 2], center=true);
    translate([10, 11, 2.0]) cube([1, 1, 4], center=true);
    translate([10, 12, 4.0]) cube([1, 1, 8], center=true);
    translate([10, 13, 4.5]) cube([1, 1, 9], center=true);
    translate([10, 14, 0.5]) cube([1, 1, 1], center=true);
    translate([10, 15, 1.0]) cube([1, 1, 2], center=true);
    translate([10, 16, 3.5]) cube([1, 1, 7], center=true);
    translate([10, 17, 4.0]) cube([1, 1, 8], center=true);
    translate([10, 18, 4.5]) cube([1, 1, 9], center=true);
    translate([10, 19, 0.5]) cube([1, 1, 1], center=true);
    translate([11, 0, 1.0]) cube([1, 1, 2], center=true);
    translate([11, 1, 3.5]) cube([1, 1, 7], center=true);
    translate([11, 2, 2.0]) cube([1, 1, 4], center=true);
    translate([11, 3, 2.0]) cube([1, 1, 4], center=true);
    translate([11, 4, 2.5]) cube([1, 1, 5], center=true);
    translate([11, 6, 2.5]) cube([1, 1, 5], center=true);
    translate([11, 7, 2.0]) cube([1, 1, 4], center=true);
    translate([11, 8, 2.0]) cube([1, 1, 4], center=true);
    translate([11, 9, 2.0]) cube([1, 1, 4], center=true);
    translate([11, 10, 2.0]) cube([1, 1, 4], center=true);
    translate([11, 11, 2.0]) cube([1, 1, 4], center=true);
    translate([11, 12, 4.0]) cube([1, 1, 8], center=true);
    translate([11, 13, 4.5]) cube([1, 1, 9], center=true);
    translate([11, 14, 0.5]) cube([1, 1, 1], center=true);
    translate([11, 15, 1.0]) cube([1, 1, 2], center=true);
    translate([11, 16, 3.5]) cube([1, 1, 7], center=true);
    translate([11, 17, 4.0]) cube([1, 1, 8], center=true);
    translate([11, 18, 4.5]) cube([1, 1, 9], center=true);
    translate([11, 19, 0.5]) cube([1, 1, 1], center=true);
    translate([12, 0, 1.0]) cube([1, 1, 2], center=true);
    translate([12, 1, 3.5]) cube([1, 1, 7], center=true);
    translate([12, 2, 2.0]) cube([1, 1, 4], center=true);
    translate([12, 3, 4.5]) cube([1, 1, 9], center=true);
    translate([12, 4, 0.5]) cube([1, 1, 1], center=true);
    translate([12, 5, 1.0]) cube([1, 1, 2], center=true);
    translate([12, 6, 3.5]) cube([1, 1, 7], center=true);
    translate([12, 7, 4.0]) cube([1, 1, 8], center=true);
    translate([12, 8, 4.5]) cube([1, 1, 9], center=true);
    translate([12, 9, 0.5]) cube([1, 1, 1], center=true);
    translate([12, 10, 1.0]) cube([1, 1, 2], center=true);
    translate([12, 11, 3.5]) cube([1, 1, 7], center=true);
    translate([12, 12, 4.0]) cube([1, 1, 8], center=true);
    translate([12, 13, 4.5]) cube([1, 1, 9], center=true);
    translate([12, 14, 0.5]) cube([1, 1, 1], center=true);
    translate([12, 15, 1.0]) cube([1, 1, 2], center=true);
    translate([12, 16, 3.5]) cube([1, 1, 7], center=true);
    translate([12, 17, 4.0]) cube([1, 1, 8], center=true);
    translate([12, 18, 4.5]) cube([1, 1, 9], center=true);
    translate([12, 19, 0.5]) cube([1, 1, 1], center=true);
    translate([13, 0, 1.0]) cube([1, 1, 2], center=true);
    translate([13, 1, 3.5]) cube([1, 1, 7], center=true);
    translate([13, 2, 2.0]) cube([1, 1, 4], center=true);
    translate([13, 3, 2.0]) cube([1, 1, 4], center=true);
    translate([13, 4, 2.0]) cube([1, 1, 4], center=true);
    translate([13, 5, 2.0]) cube([1, 1, 4], center=true);
    translate([13, 6, 2.5]) cube([1, 1, 5], center=true);
    translate([13, 8, 2.5]) cube([1, 1, 5], center=true);
    translate([13, 9, 2.0]) cube([1, 1, 4], center=true);
    translate([13, 10, 2.0]) cube([1, 1, 4], center=true);
    translate([13, 11, 2.0]) cube([1, 1, 4], center=true);
    translate([13, 12, 4.0]) cube([1, 1, 8], center=true);
    translate([13, 13, 4.5]) cube([1, 1, 9], center=true);
    translate([13, 14, 0.5]) cube([1, 1, 1], center=true);
    translate([13, 15, 1.0]) cube([1, 1, 2], center=true);
    translate([13, 16, 3.5]) cube([1, 1, 7], center=true);
    translate([13, 17, 4.0]) cube([1, 1, 8], center=true);
    translate([13, 18, 4.5]) cube([1, 1, 9], center=true);
    translate([13, 19, 0.5]) cube([1, 1, 1], center=true);
    translate([14, 0, 1.0]) cube([1, 1, 2], center=true);
    translate([14, 1, 3.5]) cube([1, 1, 7], center=true);
    translate([14, 2, 4.0]) cube([1, 1, 8], center=true);
    translate([14, 3, 4.5]) cube([1, 1, 9], center=true);
    translate([14, 4, 0.5]) cube([1, 1, 1], center=true);
    translate([14, 5, 1.0]) cube([1, 1, 2], center=true);
    translate([14, 6, 3.5]) cube([1, 1, 7], center=true);
    translate([14, 7, 4.0]) cube([1, 1, 8], center=true);
    translate([14, 8, 4.5]) cube([1, 1, 9], center=true);
    translate([14, 9, 0.5]) cube([1, 1, 1], center=true);
    translate([14, 10, 1.0]) cube([1, 1, 2], center=true);
    translate([14, 11, 2.0]) cube([1, 1, 4], center=true);
    translate([14, 12, 4.0]) cube([1, 1, 8], center=true);
    translate([14, 13, 4.5]) cube([1, 1, 9], center=true);
    translate([14, 14, 0.5]) cube([1, 1, 1], center=true);
    translate([14, 15, 1.0]) cube([1, 1, 2], center=true);
    translate([14, 16, 3.5]) cube([1, 1, 7], center=true);
    translate([14, 17, 4.0]) cube([1, 1, 8], center=true);
    translate([14, 18, 4.5]) cube([1, 1, 9], center=true);
    translate([14, 19, 0.5]) cube([1, 1, 1], center=true);
    translate([15, 0, 1.0]) cube([1, 1, 2], center=true);
    translate([15, 1, 3.5]) cube([1, 1, 7], center=true);
    translate([15, 2, 2.0]) cube([1, 1, 4], center=true);
    translate([15, 3, 2.0]) cube([1, 1, 4], center=true);
    translate([15, 4, 2.5]) cube([1, 1, 5], center=true);
    translate([15, 6, 2.5]) cube([1, 1, 5], center=true);
    translate([15, 7, 2.0]) cube([1, 1, 4], center=true);
    translate([15, 8, 2.0]) cube([1, 1, 4], center=true);
    translate([15, 9, 2.0]) cube([1, 1, 4], center=true);
    translate([15, 10, 2.0]) cube([1, 1, 4], center=true);
    translate([15, 11, 2.0]) cube([1, 1, 4], center=true);
    translate([15, 12, 4.0]) cube([1, 1, 8], center=true);
    translate([15, 13, 4.5]) cube([1, 1, 9], center=true);
    translate([15, 14, 0.5]) cube([1, 1, 1], center=true);
    translate([15, 15, 1.0]) cube([1, 1, 2], center=true);
    translate([15, 16, 3.5]) cube([1, 1, 7], center=true);
    translate([15, 17, 4.0]) cube([1, 1, 8], center=true);
    translate([15, 18, 4.5]) cube([1, 1, 9], center=true);
    translate([15, 19, 0.5]) cube([1, 1, 1], center=true);
    translate([16, 0, 1.0]) cube([1, 1, 2], center=true);
    translate([16, 1, 3.5]) cube([1, 1, 7], center=true);
    translate([16, 2, 2.0]) cube([1, 1, 4], center=true);
    translate([16, 3, 4.5]) cube([1, 1, 9], center=true);
    translate([16, 4, 0.5]) cube([1, 1, 1], center=true);
    translate([16, 5, 1.0]) cube([1, 1, 2], center=true);
    translate([16, 6, 3.5]) cube([1, 1, 7], center=true);
    translate([16, 7, 4.0]) cube([1, 1, 8], center=true);
    translate([16, 8, 4.5]) cube([1, 1, 9], center=true);
    translate([16, 9, 0.5]) cube([1, 1, 1], center=true);
    translate([16, 10, 1.0]) cube([1, 1, 2], center=true);
    translate([16, 11, 3.5]) cube([1, 1, 7], center=true);
    translate([16, 12, 4.0]) cube([1, 1, 8], center=true);
    translate([16, 13, 4.5]) cube([1, 1, 9], center=true);
    translate([16, 14, 0.5]) cube([1, 1, 1], center=true);
    translate([16, 15, 1.0]) cube([1, 1, 2], center=true);
    translate([16, 16, 3.5]) cube([1, 1, 7], center=true);
    translate([16, 17, 4.0]) cube([1, 1, 8], center=true);
    translate([16, 18, 4.5]) cube([1, 1, 9], center=true);
    translate([16, 19, 0.5]) cube([1, 1, 1], center=true);
    translate([17, 0, 1.0]) cube([1, 1, 2], center=true);
    translate([17, 1, 3.5]) cube([1, 1, 7], center=true);
    translate([17, 2, 2.0]) cube([1, 1, 4], center=true);
    translate([17, 3, 2.0]) cube([1, 1, 4], center=true);
    translate([17, 4, 2.0]) cube([1, 1, 4], center=true);
    translate([17, 5, 2.0]) cube([1, 1, 4], center=true);
    translate([17, 6, 2.0]) cube([1, 1, 4], center=true);
    translate([17, 7, 2.0]) cube([1, 1, 4], center=true);
    translate([17, 8, 2.0]) cube([1, 1, 4], center=true);
    translate([17, 9, 2.0]) cube([1, 1, 4], center=true);
    translate([17, 10, 4.5]) color([0, 0, 1]) cube([1, 1, 1], center=true);
    translate([17, 11, 4.0]) cube([1, 1, 8], center=true);
    translate([17, 12, 4.5]) cube([1, 1, 9], center=true);
    translate([17, 13, 0.5]) cube([1, 1, 1], center=true);
    translate([17, 14, 1.0]) cube([1, 1, 2], center=true);
    translate([17, 15, 3.5]) cube([1, 1, 7], center=true);
    translate([17, 16, 4.0]) cube([1, 1, 8], center=true);
    translate([17, 17, 4.5]) cube([1, 1, 9], center=true);
    translate([17, 18, 0.5]) cube([1, 1, 1], center=true);
    translate([18, 0, 1.0]) cube([1, 1, 2], center=true);
    translate([18, 1, 3.5]) cube([1, 1, 7], center=true);
    translate([18, 2, 4.0]) cube([1, 1, 8], center=true);
    translate([18, 3, 4.5]) cube([1, 1, 9], center=true);
    translate([18, 4, 0.5]) cube([1, 1, 1], center=true);
    translate([18, 5, 1.0]) cube([1, 1, 2], center=true);
    translate([18, 6, 3.5]) cube([1, 1, 7], center=true);
    translate([18, 7, 4.0]) cube([1, 1, 8], center=true);
    translate([18, 8, 4.5]) cube([1, 1, 9], center=true);
    translate([18, 9, 0.5]) cube([1, 1, 1], center=true);
    translate([18, 10, 1.0]) cube([1, 1, 2], center=true);
    translate([18, 11, 3.5]) cube([1, 1, 7], center=true);
    translate([18, 12, 4.0]) cube([1, 1, 8], center=true);
    translate([18, 13, 4.5]) cube([1, 1, 9], center=true);
    translate([18, 14, 0.5]) cube([1, 1, 1], center=true);
    translate([18, 15, 1.0]) cube([1, 1, 2], center=true);
    translate([18, 16, 3.5]) cube([1, 1, 7], center=true);
    translate([18, 17, 4.0]) cube([1, 1, 8], center=true);
    translate([18, 18, 4.5]) cube([1, 1, 9], center=true);
    translate([18, 19, 0.5]) cube([1, 1, 1], center=true);
    translate([19, 0, 1.0]) cube([1, 1, 2], center=true);
    translate([19, 1, 3.5]) cube([1, 1, 7], center=true);
    translate([19, 2, 4.0]) cube([1, 1, 8], center=true);
    translate([19, 3, 4.5]) cube([1, 1, 9], center=true);
    translate([19, 4, 0.5]) cube([1, 1, 1], center=true);
    translate([19, 5, 1.0]) cube([1, 1, 2], center=true);
    translate([19, 6, 3.5]) cube([1, 1, 7], center=true);
    translate([19, 7, 4.0]) cube([1, 1, 8], center=true);
    translate([19, 8, 4.5]) cube([1, 1, 9], center=true);
    translate([19, 9, 0.5]) cube([1, 1, 1], center=true);
    translate([19, 10, 1.0]) cube([1, 1, 2], center=true);
    translate([19, 11, 3.5]) cube([1, 1, 7], center=true);
    translate([19, 12, 4.0]) cube([1, 1, 8], center=true);
    translate([19, 13, 4.5]) cube([1, 1, 9], center=true);
    translate([19, 14, 0.5]) cube([1, 1, 1], center=true);
    translate([19, 15, 1.0]) cube([1, 1, 2], center=true);
    translate([19, 16, 3.5]) cube([1, 1, 7], center=true);
    translate([19, 17, 4.0]) cube([1, 1, 8], center=true);
    translate([19, 18, 4.5]) cube([1, 1, 9], center=true);
    translate([19, 19, 0.5]) cube([1, 1, 1], center=true);
}
